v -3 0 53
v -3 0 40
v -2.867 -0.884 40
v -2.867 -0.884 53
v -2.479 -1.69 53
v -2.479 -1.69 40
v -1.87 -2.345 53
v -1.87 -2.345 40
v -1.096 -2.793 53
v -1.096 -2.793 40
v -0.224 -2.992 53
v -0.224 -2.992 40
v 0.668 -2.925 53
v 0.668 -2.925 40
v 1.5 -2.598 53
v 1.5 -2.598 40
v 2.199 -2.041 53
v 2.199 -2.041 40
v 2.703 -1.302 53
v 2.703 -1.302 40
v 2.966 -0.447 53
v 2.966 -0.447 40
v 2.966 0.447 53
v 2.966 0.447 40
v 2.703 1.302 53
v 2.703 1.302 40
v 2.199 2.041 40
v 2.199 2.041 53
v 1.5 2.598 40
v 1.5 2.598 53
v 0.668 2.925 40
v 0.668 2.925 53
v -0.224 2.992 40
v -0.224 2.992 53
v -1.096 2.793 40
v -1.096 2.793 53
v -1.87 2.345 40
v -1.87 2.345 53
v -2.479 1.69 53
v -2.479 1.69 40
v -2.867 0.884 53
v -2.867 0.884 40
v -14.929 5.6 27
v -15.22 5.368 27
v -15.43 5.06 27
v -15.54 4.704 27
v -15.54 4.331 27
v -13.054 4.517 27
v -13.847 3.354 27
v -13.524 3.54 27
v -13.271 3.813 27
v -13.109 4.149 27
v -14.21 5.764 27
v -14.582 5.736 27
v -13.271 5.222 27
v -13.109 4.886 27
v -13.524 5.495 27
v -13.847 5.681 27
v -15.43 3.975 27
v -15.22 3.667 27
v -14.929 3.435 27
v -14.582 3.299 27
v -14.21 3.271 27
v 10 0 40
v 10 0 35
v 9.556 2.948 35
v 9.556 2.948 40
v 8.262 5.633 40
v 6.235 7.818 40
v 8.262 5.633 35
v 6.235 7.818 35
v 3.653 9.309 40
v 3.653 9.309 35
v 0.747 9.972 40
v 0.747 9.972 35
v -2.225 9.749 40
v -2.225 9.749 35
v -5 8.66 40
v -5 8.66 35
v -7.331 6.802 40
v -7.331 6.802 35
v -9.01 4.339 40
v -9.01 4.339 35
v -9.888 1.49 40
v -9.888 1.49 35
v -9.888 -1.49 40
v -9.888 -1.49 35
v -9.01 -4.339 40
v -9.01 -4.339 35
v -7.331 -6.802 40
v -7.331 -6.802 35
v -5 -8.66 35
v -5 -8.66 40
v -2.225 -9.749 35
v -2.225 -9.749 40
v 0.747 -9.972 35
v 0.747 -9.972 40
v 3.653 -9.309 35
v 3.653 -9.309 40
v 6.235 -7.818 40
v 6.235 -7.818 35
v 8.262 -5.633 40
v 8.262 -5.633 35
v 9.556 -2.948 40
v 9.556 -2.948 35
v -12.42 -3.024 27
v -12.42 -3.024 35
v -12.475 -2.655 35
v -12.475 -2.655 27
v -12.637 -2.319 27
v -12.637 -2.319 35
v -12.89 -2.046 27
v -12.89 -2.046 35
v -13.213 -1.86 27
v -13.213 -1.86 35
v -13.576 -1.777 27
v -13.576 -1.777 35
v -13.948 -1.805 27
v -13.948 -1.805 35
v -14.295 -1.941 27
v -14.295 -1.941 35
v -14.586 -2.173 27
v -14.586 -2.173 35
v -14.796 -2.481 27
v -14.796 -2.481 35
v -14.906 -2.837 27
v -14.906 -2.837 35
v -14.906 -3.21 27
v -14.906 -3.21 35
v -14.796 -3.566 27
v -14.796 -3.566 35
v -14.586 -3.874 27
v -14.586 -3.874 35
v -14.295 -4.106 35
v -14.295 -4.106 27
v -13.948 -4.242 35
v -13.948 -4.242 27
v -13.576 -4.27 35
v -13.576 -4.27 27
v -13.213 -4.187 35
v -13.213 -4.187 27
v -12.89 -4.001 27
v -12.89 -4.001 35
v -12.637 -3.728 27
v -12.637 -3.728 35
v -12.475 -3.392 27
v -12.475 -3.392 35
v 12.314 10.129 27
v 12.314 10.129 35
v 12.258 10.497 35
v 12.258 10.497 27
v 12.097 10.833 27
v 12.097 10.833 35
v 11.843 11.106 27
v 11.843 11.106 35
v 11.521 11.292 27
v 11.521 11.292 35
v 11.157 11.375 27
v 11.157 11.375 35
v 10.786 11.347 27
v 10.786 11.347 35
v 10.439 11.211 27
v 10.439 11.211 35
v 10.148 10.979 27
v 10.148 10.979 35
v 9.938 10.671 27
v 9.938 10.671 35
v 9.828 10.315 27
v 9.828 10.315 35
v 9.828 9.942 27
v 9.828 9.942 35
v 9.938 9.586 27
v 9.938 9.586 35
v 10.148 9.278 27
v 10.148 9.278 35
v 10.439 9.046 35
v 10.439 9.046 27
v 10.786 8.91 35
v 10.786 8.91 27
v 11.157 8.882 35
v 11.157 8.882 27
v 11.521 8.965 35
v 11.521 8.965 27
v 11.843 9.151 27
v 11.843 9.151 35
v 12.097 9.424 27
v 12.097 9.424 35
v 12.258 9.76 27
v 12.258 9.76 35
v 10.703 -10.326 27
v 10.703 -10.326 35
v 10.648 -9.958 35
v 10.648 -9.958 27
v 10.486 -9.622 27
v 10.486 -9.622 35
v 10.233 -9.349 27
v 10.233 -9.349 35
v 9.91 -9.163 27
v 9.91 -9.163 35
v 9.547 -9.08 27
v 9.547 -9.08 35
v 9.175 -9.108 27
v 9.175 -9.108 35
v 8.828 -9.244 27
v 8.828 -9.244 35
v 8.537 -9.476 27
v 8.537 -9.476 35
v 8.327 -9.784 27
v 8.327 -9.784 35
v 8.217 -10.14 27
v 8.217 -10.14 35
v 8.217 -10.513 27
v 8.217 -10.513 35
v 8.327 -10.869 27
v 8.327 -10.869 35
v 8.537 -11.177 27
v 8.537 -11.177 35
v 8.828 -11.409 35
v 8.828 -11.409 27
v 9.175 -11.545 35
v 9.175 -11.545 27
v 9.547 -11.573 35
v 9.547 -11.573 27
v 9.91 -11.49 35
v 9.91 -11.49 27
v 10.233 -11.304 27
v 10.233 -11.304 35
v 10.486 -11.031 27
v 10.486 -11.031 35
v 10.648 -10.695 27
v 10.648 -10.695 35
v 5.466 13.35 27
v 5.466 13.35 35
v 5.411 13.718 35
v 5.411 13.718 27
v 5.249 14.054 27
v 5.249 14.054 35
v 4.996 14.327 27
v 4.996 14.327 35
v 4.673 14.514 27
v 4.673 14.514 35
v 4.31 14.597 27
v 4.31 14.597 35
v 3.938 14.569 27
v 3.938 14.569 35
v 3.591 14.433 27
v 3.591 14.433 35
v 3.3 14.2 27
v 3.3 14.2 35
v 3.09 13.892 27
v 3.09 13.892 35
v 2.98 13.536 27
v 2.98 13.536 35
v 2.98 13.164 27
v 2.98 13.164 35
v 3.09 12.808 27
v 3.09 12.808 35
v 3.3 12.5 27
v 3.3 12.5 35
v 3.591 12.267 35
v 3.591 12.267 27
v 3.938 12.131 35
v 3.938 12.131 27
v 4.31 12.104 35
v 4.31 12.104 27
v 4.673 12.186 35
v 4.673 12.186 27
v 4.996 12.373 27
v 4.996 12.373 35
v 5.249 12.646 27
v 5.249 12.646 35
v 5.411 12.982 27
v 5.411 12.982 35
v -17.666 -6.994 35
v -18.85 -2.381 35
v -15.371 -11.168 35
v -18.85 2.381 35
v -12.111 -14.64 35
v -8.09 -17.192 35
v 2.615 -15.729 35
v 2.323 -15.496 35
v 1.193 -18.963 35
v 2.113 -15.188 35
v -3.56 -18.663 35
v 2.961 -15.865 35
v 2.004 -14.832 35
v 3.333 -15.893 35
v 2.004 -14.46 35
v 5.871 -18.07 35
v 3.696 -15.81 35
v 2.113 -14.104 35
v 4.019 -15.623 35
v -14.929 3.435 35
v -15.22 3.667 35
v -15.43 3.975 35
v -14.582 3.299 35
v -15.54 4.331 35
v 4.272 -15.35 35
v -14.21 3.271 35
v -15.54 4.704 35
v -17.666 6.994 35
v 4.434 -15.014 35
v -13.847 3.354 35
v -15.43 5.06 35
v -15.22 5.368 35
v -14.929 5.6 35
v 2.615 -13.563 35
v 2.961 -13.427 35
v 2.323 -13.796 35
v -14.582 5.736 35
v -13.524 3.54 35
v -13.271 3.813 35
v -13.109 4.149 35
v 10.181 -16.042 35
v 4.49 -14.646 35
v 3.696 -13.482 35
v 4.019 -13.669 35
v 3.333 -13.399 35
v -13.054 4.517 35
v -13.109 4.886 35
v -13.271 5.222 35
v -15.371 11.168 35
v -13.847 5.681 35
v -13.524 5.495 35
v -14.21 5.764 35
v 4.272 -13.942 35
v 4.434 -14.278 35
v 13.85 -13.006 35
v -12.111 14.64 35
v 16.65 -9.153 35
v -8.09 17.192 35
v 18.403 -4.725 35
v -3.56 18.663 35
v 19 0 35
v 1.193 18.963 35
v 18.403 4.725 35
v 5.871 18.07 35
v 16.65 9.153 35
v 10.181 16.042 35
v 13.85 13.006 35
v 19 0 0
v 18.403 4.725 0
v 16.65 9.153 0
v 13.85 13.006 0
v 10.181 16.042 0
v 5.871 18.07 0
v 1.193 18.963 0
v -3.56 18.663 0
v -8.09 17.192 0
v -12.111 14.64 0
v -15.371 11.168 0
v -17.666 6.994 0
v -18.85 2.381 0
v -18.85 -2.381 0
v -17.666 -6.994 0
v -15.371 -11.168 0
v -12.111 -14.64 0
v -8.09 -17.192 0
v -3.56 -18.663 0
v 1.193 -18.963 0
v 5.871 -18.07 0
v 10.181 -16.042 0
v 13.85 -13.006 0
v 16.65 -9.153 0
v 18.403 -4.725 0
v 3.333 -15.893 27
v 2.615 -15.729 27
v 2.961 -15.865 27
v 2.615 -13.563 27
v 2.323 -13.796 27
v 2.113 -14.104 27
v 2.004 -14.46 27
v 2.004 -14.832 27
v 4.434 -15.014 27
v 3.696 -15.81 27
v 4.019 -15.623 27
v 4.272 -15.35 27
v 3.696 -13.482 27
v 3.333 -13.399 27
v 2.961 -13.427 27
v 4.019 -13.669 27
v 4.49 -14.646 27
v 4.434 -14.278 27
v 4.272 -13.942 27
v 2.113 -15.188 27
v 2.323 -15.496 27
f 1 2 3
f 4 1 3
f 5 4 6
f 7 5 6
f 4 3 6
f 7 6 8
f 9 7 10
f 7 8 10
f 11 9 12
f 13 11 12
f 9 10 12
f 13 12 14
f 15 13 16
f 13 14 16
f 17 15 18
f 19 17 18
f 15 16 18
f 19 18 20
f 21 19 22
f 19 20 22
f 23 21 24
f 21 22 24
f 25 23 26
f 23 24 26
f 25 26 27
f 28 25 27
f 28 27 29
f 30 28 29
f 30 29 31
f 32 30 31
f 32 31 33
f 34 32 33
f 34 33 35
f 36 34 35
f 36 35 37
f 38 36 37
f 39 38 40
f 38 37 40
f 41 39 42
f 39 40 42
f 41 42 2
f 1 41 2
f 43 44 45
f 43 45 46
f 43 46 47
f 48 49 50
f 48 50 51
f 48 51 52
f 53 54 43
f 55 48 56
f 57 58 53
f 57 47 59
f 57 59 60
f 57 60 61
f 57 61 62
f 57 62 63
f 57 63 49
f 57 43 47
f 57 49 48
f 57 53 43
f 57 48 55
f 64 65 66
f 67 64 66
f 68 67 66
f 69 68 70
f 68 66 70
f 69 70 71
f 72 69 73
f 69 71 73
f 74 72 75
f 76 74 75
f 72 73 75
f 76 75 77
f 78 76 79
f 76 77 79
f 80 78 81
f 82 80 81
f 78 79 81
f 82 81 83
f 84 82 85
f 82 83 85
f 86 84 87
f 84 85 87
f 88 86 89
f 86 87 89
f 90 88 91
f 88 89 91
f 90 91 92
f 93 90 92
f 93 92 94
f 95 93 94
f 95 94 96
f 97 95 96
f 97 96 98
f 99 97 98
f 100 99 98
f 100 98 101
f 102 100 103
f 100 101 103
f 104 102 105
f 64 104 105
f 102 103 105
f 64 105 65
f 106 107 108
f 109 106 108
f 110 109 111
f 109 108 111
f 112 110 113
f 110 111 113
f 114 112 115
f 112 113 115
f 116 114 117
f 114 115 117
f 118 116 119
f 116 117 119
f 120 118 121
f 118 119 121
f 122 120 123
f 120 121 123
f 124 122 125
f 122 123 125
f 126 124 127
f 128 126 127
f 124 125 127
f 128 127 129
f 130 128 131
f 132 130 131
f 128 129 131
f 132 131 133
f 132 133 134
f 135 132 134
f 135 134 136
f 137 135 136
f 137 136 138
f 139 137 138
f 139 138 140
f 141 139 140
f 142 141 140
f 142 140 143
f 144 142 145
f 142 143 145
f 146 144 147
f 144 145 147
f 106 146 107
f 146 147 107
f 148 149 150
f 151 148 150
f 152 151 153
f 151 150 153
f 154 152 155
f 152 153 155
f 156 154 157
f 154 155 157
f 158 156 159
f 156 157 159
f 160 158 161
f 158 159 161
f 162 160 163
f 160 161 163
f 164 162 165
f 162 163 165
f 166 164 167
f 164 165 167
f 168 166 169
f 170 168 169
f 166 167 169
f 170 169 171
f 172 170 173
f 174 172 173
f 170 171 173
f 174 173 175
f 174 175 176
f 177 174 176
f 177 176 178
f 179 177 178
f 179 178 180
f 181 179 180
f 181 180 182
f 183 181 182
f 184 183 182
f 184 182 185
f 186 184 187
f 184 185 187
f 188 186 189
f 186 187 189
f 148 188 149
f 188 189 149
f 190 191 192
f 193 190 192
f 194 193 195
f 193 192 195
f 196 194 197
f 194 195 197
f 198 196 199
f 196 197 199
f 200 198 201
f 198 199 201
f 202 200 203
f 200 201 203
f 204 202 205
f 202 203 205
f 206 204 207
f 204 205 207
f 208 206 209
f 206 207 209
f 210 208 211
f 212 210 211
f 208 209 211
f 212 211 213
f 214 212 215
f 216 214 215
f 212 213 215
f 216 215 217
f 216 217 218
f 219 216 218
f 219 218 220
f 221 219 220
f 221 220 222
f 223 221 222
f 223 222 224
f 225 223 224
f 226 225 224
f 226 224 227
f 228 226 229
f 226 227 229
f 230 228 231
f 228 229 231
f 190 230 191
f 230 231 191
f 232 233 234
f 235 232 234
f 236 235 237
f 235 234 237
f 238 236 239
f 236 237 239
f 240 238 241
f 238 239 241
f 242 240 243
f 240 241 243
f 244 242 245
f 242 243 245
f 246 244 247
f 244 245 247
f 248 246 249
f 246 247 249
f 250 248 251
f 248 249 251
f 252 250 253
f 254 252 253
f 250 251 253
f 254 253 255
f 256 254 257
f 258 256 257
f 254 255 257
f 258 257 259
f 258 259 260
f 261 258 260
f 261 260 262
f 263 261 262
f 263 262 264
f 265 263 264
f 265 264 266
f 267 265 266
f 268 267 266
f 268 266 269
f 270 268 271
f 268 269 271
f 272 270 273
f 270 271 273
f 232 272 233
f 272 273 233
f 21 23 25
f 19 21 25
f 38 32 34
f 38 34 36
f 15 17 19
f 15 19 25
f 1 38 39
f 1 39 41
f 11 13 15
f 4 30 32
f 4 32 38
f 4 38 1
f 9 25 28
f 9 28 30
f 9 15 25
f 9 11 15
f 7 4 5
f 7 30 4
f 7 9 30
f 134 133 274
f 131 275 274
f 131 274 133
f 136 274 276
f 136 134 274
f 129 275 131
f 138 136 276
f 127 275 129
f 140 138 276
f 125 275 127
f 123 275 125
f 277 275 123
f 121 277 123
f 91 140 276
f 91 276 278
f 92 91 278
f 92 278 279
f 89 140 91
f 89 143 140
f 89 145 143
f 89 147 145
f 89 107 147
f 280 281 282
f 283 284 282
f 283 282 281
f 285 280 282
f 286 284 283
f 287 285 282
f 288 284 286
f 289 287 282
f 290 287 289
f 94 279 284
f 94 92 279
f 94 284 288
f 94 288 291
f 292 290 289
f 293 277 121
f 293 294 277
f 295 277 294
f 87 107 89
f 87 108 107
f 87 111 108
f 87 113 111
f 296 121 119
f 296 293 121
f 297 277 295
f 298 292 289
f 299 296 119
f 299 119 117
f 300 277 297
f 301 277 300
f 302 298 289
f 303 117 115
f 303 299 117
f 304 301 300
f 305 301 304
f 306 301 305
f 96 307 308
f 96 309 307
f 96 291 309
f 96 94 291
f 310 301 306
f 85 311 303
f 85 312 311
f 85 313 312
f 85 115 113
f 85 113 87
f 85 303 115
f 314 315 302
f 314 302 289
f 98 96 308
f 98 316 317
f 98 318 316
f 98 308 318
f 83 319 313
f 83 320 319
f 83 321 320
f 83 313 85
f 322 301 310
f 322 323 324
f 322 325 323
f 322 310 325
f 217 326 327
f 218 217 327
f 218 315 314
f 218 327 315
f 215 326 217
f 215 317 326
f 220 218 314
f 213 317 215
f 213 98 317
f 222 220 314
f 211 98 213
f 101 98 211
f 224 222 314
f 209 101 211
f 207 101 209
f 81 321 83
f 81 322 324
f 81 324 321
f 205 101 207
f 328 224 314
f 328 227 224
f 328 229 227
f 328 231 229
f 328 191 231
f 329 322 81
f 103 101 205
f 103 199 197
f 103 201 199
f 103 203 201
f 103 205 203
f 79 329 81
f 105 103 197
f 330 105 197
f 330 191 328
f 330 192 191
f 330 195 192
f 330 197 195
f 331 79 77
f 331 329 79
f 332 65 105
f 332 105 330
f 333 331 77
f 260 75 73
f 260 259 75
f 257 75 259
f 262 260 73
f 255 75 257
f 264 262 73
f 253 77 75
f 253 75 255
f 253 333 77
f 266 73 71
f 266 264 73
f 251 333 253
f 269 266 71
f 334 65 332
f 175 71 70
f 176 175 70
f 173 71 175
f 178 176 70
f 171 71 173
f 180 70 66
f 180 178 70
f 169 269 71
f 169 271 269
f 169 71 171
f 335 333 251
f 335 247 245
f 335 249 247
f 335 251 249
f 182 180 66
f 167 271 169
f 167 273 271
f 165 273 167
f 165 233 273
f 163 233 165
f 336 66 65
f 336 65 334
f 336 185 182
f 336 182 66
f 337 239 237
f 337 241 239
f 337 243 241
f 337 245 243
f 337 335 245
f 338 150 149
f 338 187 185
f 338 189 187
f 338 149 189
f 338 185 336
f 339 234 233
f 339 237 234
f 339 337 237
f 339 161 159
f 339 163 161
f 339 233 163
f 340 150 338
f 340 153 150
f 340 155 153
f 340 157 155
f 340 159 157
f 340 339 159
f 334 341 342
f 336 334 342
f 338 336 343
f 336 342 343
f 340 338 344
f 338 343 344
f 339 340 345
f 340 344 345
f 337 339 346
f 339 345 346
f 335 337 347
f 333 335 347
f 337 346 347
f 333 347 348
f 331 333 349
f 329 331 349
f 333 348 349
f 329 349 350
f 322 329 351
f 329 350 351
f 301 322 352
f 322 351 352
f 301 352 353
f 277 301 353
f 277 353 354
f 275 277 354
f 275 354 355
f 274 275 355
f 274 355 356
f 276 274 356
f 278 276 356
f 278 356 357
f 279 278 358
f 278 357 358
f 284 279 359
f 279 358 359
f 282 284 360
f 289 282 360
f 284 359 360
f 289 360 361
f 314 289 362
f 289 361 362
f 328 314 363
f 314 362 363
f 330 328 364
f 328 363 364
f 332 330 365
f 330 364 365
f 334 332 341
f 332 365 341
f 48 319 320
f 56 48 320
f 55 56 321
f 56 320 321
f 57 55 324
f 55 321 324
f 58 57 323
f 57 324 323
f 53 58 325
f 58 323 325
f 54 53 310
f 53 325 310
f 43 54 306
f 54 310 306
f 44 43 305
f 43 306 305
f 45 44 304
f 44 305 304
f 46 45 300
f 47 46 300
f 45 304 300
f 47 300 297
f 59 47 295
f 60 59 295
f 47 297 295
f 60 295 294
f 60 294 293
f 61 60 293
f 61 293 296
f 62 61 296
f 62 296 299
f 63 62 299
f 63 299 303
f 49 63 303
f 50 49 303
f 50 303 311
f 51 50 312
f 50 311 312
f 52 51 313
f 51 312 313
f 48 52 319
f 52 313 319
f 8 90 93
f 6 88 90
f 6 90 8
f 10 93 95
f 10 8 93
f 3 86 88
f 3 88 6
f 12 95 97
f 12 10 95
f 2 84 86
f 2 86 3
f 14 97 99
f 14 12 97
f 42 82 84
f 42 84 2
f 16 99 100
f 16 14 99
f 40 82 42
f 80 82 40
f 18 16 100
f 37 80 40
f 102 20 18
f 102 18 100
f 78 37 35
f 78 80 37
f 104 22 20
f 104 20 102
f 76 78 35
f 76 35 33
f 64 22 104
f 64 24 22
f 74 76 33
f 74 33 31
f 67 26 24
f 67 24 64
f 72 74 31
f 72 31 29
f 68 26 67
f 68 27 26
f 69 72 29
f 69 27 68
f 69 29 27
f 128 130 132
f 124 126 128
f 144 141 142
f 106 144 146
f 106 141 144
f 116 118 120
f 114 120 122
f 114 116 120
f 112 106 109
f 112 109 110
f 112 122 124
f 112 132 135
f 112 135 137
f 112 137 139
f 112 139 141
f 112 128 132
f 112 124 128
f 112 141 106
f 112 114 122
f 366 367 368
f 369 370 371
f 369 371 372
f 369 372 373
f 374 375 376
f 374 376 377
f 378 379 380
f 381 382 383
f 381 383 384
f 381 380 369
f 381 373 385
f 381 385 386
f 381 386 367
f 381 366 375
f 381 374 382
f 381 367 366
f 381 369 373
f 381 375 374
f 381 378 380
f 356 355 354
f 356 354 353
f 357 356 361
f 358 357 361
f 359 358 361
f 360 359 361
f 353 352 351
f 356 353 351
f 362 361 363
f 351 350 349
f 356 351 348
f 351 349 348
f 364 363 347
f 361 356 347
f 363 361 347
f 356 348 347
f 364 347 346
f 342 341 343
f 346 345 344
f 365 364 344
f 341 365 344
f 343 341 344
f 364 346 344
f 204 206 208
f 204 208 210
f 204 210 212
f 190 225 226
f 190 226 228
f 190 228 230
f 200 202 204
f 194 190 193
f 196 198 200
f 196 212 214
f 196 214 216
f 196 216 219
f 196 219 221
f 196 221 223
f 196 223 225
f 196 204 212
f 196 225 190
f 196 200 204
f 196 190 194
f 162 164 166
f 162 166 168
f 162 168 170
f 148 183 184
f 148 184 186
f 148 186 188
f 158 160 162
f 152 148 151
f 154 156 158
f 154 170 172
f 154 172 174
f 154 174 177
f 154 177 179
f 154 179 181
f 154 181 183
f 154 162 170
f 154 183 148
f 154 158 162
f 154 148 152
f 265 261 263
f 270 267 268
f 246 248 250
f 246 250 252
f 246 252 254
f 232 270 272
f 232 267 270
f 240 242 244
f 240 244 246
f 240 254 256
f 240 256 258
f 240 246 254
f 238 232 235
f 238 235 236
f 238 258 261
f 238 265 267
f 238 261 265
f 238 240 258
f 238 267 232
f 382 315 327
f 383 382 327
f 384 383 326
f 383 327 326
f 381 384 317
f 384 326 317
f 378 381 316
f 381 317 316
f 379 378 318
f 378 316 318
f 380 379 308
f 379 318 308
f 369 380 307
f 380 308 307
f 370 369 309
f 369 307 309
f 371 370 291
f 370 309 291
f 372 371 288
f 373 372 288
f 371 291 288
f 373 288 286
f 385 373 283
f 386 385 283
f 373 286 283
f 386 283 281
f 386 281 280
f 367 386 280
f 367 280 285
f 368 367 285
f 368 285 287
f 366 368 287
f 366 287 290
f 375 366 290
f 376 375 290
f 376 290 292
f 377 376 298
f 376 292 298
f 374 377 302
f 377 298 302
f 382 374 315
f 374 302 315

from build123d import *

# Parameters (mm, degrees)
ESQUISSE1_R             = 19
BOSS_EXTRU_1_DEPTH      = 35
ESQUISSE2_R             = 10
BOSS_EXTRU_2_DEPTH      = 5
ESQUISSE3_R             = 3
BOSS_EXTRU_3_DEPTH      = 13
ESQUISSE4_R             = 1.25
ENL_V_MAT_EXTRU_1_DEPTH = 8


with BuildPart() as part:
    # Esquisse1 → Boss.-Extru.1 (new body)
    with BuildSketch(Plane.XY):
        Circle(ESQUISSE1_R)
    extrude(amount=BOSS_EXTRU_1_DEPTH)

    # Esquisse2 → Boss.-Extru.2 (add)
    with BuildSketch(Plane.XY.offset(35)):
        Circle(ESQUISSE2_R)
    extrude(amount=BOSS_EXTRU_2_DEPTH)

    # Esquisse3 → Boss.-Extru.3 (add)
    with BuildSketch(Plane.XY.offset(40)):
        with Locations(Location((0, 0, 0), (0, 0, 180))):
            Circle(ESQUISSE3_R)
    extrude(amount=BOSS_EXTRU_3_DEPTH)

    # Esquisse4 → Enlèv. mat.-Extru.1 (cut)
    with BuildSketch(Plane.XY.offset(35)):
        with Locations((3.239548848, -14.646000248)):
            Circle(ESQUISSE4_R)
        with Locations((9.453296275, -10.326431598)):
            Circle(ESQUISSE4_R)
        with Locations((-13.669600231, -3.023578925)):
            Circle(ESQUISSE4_R)
        with Locations((-14.303582703, 4.517468525)):
            Circle(ESQUISSE4_R)
        with Locations((4.216303956, 13.350010522)):
            Circle(ESQUISSE4_R)
        with Locations((11.064033854, 10.128531723)):
            Circle(ESQUISSE4_R)
    extrude(amount=-ENL_V_MAT_EXTRU_1_DEPTH, mode=Mode.SUBTRACT)


solid = part.part
